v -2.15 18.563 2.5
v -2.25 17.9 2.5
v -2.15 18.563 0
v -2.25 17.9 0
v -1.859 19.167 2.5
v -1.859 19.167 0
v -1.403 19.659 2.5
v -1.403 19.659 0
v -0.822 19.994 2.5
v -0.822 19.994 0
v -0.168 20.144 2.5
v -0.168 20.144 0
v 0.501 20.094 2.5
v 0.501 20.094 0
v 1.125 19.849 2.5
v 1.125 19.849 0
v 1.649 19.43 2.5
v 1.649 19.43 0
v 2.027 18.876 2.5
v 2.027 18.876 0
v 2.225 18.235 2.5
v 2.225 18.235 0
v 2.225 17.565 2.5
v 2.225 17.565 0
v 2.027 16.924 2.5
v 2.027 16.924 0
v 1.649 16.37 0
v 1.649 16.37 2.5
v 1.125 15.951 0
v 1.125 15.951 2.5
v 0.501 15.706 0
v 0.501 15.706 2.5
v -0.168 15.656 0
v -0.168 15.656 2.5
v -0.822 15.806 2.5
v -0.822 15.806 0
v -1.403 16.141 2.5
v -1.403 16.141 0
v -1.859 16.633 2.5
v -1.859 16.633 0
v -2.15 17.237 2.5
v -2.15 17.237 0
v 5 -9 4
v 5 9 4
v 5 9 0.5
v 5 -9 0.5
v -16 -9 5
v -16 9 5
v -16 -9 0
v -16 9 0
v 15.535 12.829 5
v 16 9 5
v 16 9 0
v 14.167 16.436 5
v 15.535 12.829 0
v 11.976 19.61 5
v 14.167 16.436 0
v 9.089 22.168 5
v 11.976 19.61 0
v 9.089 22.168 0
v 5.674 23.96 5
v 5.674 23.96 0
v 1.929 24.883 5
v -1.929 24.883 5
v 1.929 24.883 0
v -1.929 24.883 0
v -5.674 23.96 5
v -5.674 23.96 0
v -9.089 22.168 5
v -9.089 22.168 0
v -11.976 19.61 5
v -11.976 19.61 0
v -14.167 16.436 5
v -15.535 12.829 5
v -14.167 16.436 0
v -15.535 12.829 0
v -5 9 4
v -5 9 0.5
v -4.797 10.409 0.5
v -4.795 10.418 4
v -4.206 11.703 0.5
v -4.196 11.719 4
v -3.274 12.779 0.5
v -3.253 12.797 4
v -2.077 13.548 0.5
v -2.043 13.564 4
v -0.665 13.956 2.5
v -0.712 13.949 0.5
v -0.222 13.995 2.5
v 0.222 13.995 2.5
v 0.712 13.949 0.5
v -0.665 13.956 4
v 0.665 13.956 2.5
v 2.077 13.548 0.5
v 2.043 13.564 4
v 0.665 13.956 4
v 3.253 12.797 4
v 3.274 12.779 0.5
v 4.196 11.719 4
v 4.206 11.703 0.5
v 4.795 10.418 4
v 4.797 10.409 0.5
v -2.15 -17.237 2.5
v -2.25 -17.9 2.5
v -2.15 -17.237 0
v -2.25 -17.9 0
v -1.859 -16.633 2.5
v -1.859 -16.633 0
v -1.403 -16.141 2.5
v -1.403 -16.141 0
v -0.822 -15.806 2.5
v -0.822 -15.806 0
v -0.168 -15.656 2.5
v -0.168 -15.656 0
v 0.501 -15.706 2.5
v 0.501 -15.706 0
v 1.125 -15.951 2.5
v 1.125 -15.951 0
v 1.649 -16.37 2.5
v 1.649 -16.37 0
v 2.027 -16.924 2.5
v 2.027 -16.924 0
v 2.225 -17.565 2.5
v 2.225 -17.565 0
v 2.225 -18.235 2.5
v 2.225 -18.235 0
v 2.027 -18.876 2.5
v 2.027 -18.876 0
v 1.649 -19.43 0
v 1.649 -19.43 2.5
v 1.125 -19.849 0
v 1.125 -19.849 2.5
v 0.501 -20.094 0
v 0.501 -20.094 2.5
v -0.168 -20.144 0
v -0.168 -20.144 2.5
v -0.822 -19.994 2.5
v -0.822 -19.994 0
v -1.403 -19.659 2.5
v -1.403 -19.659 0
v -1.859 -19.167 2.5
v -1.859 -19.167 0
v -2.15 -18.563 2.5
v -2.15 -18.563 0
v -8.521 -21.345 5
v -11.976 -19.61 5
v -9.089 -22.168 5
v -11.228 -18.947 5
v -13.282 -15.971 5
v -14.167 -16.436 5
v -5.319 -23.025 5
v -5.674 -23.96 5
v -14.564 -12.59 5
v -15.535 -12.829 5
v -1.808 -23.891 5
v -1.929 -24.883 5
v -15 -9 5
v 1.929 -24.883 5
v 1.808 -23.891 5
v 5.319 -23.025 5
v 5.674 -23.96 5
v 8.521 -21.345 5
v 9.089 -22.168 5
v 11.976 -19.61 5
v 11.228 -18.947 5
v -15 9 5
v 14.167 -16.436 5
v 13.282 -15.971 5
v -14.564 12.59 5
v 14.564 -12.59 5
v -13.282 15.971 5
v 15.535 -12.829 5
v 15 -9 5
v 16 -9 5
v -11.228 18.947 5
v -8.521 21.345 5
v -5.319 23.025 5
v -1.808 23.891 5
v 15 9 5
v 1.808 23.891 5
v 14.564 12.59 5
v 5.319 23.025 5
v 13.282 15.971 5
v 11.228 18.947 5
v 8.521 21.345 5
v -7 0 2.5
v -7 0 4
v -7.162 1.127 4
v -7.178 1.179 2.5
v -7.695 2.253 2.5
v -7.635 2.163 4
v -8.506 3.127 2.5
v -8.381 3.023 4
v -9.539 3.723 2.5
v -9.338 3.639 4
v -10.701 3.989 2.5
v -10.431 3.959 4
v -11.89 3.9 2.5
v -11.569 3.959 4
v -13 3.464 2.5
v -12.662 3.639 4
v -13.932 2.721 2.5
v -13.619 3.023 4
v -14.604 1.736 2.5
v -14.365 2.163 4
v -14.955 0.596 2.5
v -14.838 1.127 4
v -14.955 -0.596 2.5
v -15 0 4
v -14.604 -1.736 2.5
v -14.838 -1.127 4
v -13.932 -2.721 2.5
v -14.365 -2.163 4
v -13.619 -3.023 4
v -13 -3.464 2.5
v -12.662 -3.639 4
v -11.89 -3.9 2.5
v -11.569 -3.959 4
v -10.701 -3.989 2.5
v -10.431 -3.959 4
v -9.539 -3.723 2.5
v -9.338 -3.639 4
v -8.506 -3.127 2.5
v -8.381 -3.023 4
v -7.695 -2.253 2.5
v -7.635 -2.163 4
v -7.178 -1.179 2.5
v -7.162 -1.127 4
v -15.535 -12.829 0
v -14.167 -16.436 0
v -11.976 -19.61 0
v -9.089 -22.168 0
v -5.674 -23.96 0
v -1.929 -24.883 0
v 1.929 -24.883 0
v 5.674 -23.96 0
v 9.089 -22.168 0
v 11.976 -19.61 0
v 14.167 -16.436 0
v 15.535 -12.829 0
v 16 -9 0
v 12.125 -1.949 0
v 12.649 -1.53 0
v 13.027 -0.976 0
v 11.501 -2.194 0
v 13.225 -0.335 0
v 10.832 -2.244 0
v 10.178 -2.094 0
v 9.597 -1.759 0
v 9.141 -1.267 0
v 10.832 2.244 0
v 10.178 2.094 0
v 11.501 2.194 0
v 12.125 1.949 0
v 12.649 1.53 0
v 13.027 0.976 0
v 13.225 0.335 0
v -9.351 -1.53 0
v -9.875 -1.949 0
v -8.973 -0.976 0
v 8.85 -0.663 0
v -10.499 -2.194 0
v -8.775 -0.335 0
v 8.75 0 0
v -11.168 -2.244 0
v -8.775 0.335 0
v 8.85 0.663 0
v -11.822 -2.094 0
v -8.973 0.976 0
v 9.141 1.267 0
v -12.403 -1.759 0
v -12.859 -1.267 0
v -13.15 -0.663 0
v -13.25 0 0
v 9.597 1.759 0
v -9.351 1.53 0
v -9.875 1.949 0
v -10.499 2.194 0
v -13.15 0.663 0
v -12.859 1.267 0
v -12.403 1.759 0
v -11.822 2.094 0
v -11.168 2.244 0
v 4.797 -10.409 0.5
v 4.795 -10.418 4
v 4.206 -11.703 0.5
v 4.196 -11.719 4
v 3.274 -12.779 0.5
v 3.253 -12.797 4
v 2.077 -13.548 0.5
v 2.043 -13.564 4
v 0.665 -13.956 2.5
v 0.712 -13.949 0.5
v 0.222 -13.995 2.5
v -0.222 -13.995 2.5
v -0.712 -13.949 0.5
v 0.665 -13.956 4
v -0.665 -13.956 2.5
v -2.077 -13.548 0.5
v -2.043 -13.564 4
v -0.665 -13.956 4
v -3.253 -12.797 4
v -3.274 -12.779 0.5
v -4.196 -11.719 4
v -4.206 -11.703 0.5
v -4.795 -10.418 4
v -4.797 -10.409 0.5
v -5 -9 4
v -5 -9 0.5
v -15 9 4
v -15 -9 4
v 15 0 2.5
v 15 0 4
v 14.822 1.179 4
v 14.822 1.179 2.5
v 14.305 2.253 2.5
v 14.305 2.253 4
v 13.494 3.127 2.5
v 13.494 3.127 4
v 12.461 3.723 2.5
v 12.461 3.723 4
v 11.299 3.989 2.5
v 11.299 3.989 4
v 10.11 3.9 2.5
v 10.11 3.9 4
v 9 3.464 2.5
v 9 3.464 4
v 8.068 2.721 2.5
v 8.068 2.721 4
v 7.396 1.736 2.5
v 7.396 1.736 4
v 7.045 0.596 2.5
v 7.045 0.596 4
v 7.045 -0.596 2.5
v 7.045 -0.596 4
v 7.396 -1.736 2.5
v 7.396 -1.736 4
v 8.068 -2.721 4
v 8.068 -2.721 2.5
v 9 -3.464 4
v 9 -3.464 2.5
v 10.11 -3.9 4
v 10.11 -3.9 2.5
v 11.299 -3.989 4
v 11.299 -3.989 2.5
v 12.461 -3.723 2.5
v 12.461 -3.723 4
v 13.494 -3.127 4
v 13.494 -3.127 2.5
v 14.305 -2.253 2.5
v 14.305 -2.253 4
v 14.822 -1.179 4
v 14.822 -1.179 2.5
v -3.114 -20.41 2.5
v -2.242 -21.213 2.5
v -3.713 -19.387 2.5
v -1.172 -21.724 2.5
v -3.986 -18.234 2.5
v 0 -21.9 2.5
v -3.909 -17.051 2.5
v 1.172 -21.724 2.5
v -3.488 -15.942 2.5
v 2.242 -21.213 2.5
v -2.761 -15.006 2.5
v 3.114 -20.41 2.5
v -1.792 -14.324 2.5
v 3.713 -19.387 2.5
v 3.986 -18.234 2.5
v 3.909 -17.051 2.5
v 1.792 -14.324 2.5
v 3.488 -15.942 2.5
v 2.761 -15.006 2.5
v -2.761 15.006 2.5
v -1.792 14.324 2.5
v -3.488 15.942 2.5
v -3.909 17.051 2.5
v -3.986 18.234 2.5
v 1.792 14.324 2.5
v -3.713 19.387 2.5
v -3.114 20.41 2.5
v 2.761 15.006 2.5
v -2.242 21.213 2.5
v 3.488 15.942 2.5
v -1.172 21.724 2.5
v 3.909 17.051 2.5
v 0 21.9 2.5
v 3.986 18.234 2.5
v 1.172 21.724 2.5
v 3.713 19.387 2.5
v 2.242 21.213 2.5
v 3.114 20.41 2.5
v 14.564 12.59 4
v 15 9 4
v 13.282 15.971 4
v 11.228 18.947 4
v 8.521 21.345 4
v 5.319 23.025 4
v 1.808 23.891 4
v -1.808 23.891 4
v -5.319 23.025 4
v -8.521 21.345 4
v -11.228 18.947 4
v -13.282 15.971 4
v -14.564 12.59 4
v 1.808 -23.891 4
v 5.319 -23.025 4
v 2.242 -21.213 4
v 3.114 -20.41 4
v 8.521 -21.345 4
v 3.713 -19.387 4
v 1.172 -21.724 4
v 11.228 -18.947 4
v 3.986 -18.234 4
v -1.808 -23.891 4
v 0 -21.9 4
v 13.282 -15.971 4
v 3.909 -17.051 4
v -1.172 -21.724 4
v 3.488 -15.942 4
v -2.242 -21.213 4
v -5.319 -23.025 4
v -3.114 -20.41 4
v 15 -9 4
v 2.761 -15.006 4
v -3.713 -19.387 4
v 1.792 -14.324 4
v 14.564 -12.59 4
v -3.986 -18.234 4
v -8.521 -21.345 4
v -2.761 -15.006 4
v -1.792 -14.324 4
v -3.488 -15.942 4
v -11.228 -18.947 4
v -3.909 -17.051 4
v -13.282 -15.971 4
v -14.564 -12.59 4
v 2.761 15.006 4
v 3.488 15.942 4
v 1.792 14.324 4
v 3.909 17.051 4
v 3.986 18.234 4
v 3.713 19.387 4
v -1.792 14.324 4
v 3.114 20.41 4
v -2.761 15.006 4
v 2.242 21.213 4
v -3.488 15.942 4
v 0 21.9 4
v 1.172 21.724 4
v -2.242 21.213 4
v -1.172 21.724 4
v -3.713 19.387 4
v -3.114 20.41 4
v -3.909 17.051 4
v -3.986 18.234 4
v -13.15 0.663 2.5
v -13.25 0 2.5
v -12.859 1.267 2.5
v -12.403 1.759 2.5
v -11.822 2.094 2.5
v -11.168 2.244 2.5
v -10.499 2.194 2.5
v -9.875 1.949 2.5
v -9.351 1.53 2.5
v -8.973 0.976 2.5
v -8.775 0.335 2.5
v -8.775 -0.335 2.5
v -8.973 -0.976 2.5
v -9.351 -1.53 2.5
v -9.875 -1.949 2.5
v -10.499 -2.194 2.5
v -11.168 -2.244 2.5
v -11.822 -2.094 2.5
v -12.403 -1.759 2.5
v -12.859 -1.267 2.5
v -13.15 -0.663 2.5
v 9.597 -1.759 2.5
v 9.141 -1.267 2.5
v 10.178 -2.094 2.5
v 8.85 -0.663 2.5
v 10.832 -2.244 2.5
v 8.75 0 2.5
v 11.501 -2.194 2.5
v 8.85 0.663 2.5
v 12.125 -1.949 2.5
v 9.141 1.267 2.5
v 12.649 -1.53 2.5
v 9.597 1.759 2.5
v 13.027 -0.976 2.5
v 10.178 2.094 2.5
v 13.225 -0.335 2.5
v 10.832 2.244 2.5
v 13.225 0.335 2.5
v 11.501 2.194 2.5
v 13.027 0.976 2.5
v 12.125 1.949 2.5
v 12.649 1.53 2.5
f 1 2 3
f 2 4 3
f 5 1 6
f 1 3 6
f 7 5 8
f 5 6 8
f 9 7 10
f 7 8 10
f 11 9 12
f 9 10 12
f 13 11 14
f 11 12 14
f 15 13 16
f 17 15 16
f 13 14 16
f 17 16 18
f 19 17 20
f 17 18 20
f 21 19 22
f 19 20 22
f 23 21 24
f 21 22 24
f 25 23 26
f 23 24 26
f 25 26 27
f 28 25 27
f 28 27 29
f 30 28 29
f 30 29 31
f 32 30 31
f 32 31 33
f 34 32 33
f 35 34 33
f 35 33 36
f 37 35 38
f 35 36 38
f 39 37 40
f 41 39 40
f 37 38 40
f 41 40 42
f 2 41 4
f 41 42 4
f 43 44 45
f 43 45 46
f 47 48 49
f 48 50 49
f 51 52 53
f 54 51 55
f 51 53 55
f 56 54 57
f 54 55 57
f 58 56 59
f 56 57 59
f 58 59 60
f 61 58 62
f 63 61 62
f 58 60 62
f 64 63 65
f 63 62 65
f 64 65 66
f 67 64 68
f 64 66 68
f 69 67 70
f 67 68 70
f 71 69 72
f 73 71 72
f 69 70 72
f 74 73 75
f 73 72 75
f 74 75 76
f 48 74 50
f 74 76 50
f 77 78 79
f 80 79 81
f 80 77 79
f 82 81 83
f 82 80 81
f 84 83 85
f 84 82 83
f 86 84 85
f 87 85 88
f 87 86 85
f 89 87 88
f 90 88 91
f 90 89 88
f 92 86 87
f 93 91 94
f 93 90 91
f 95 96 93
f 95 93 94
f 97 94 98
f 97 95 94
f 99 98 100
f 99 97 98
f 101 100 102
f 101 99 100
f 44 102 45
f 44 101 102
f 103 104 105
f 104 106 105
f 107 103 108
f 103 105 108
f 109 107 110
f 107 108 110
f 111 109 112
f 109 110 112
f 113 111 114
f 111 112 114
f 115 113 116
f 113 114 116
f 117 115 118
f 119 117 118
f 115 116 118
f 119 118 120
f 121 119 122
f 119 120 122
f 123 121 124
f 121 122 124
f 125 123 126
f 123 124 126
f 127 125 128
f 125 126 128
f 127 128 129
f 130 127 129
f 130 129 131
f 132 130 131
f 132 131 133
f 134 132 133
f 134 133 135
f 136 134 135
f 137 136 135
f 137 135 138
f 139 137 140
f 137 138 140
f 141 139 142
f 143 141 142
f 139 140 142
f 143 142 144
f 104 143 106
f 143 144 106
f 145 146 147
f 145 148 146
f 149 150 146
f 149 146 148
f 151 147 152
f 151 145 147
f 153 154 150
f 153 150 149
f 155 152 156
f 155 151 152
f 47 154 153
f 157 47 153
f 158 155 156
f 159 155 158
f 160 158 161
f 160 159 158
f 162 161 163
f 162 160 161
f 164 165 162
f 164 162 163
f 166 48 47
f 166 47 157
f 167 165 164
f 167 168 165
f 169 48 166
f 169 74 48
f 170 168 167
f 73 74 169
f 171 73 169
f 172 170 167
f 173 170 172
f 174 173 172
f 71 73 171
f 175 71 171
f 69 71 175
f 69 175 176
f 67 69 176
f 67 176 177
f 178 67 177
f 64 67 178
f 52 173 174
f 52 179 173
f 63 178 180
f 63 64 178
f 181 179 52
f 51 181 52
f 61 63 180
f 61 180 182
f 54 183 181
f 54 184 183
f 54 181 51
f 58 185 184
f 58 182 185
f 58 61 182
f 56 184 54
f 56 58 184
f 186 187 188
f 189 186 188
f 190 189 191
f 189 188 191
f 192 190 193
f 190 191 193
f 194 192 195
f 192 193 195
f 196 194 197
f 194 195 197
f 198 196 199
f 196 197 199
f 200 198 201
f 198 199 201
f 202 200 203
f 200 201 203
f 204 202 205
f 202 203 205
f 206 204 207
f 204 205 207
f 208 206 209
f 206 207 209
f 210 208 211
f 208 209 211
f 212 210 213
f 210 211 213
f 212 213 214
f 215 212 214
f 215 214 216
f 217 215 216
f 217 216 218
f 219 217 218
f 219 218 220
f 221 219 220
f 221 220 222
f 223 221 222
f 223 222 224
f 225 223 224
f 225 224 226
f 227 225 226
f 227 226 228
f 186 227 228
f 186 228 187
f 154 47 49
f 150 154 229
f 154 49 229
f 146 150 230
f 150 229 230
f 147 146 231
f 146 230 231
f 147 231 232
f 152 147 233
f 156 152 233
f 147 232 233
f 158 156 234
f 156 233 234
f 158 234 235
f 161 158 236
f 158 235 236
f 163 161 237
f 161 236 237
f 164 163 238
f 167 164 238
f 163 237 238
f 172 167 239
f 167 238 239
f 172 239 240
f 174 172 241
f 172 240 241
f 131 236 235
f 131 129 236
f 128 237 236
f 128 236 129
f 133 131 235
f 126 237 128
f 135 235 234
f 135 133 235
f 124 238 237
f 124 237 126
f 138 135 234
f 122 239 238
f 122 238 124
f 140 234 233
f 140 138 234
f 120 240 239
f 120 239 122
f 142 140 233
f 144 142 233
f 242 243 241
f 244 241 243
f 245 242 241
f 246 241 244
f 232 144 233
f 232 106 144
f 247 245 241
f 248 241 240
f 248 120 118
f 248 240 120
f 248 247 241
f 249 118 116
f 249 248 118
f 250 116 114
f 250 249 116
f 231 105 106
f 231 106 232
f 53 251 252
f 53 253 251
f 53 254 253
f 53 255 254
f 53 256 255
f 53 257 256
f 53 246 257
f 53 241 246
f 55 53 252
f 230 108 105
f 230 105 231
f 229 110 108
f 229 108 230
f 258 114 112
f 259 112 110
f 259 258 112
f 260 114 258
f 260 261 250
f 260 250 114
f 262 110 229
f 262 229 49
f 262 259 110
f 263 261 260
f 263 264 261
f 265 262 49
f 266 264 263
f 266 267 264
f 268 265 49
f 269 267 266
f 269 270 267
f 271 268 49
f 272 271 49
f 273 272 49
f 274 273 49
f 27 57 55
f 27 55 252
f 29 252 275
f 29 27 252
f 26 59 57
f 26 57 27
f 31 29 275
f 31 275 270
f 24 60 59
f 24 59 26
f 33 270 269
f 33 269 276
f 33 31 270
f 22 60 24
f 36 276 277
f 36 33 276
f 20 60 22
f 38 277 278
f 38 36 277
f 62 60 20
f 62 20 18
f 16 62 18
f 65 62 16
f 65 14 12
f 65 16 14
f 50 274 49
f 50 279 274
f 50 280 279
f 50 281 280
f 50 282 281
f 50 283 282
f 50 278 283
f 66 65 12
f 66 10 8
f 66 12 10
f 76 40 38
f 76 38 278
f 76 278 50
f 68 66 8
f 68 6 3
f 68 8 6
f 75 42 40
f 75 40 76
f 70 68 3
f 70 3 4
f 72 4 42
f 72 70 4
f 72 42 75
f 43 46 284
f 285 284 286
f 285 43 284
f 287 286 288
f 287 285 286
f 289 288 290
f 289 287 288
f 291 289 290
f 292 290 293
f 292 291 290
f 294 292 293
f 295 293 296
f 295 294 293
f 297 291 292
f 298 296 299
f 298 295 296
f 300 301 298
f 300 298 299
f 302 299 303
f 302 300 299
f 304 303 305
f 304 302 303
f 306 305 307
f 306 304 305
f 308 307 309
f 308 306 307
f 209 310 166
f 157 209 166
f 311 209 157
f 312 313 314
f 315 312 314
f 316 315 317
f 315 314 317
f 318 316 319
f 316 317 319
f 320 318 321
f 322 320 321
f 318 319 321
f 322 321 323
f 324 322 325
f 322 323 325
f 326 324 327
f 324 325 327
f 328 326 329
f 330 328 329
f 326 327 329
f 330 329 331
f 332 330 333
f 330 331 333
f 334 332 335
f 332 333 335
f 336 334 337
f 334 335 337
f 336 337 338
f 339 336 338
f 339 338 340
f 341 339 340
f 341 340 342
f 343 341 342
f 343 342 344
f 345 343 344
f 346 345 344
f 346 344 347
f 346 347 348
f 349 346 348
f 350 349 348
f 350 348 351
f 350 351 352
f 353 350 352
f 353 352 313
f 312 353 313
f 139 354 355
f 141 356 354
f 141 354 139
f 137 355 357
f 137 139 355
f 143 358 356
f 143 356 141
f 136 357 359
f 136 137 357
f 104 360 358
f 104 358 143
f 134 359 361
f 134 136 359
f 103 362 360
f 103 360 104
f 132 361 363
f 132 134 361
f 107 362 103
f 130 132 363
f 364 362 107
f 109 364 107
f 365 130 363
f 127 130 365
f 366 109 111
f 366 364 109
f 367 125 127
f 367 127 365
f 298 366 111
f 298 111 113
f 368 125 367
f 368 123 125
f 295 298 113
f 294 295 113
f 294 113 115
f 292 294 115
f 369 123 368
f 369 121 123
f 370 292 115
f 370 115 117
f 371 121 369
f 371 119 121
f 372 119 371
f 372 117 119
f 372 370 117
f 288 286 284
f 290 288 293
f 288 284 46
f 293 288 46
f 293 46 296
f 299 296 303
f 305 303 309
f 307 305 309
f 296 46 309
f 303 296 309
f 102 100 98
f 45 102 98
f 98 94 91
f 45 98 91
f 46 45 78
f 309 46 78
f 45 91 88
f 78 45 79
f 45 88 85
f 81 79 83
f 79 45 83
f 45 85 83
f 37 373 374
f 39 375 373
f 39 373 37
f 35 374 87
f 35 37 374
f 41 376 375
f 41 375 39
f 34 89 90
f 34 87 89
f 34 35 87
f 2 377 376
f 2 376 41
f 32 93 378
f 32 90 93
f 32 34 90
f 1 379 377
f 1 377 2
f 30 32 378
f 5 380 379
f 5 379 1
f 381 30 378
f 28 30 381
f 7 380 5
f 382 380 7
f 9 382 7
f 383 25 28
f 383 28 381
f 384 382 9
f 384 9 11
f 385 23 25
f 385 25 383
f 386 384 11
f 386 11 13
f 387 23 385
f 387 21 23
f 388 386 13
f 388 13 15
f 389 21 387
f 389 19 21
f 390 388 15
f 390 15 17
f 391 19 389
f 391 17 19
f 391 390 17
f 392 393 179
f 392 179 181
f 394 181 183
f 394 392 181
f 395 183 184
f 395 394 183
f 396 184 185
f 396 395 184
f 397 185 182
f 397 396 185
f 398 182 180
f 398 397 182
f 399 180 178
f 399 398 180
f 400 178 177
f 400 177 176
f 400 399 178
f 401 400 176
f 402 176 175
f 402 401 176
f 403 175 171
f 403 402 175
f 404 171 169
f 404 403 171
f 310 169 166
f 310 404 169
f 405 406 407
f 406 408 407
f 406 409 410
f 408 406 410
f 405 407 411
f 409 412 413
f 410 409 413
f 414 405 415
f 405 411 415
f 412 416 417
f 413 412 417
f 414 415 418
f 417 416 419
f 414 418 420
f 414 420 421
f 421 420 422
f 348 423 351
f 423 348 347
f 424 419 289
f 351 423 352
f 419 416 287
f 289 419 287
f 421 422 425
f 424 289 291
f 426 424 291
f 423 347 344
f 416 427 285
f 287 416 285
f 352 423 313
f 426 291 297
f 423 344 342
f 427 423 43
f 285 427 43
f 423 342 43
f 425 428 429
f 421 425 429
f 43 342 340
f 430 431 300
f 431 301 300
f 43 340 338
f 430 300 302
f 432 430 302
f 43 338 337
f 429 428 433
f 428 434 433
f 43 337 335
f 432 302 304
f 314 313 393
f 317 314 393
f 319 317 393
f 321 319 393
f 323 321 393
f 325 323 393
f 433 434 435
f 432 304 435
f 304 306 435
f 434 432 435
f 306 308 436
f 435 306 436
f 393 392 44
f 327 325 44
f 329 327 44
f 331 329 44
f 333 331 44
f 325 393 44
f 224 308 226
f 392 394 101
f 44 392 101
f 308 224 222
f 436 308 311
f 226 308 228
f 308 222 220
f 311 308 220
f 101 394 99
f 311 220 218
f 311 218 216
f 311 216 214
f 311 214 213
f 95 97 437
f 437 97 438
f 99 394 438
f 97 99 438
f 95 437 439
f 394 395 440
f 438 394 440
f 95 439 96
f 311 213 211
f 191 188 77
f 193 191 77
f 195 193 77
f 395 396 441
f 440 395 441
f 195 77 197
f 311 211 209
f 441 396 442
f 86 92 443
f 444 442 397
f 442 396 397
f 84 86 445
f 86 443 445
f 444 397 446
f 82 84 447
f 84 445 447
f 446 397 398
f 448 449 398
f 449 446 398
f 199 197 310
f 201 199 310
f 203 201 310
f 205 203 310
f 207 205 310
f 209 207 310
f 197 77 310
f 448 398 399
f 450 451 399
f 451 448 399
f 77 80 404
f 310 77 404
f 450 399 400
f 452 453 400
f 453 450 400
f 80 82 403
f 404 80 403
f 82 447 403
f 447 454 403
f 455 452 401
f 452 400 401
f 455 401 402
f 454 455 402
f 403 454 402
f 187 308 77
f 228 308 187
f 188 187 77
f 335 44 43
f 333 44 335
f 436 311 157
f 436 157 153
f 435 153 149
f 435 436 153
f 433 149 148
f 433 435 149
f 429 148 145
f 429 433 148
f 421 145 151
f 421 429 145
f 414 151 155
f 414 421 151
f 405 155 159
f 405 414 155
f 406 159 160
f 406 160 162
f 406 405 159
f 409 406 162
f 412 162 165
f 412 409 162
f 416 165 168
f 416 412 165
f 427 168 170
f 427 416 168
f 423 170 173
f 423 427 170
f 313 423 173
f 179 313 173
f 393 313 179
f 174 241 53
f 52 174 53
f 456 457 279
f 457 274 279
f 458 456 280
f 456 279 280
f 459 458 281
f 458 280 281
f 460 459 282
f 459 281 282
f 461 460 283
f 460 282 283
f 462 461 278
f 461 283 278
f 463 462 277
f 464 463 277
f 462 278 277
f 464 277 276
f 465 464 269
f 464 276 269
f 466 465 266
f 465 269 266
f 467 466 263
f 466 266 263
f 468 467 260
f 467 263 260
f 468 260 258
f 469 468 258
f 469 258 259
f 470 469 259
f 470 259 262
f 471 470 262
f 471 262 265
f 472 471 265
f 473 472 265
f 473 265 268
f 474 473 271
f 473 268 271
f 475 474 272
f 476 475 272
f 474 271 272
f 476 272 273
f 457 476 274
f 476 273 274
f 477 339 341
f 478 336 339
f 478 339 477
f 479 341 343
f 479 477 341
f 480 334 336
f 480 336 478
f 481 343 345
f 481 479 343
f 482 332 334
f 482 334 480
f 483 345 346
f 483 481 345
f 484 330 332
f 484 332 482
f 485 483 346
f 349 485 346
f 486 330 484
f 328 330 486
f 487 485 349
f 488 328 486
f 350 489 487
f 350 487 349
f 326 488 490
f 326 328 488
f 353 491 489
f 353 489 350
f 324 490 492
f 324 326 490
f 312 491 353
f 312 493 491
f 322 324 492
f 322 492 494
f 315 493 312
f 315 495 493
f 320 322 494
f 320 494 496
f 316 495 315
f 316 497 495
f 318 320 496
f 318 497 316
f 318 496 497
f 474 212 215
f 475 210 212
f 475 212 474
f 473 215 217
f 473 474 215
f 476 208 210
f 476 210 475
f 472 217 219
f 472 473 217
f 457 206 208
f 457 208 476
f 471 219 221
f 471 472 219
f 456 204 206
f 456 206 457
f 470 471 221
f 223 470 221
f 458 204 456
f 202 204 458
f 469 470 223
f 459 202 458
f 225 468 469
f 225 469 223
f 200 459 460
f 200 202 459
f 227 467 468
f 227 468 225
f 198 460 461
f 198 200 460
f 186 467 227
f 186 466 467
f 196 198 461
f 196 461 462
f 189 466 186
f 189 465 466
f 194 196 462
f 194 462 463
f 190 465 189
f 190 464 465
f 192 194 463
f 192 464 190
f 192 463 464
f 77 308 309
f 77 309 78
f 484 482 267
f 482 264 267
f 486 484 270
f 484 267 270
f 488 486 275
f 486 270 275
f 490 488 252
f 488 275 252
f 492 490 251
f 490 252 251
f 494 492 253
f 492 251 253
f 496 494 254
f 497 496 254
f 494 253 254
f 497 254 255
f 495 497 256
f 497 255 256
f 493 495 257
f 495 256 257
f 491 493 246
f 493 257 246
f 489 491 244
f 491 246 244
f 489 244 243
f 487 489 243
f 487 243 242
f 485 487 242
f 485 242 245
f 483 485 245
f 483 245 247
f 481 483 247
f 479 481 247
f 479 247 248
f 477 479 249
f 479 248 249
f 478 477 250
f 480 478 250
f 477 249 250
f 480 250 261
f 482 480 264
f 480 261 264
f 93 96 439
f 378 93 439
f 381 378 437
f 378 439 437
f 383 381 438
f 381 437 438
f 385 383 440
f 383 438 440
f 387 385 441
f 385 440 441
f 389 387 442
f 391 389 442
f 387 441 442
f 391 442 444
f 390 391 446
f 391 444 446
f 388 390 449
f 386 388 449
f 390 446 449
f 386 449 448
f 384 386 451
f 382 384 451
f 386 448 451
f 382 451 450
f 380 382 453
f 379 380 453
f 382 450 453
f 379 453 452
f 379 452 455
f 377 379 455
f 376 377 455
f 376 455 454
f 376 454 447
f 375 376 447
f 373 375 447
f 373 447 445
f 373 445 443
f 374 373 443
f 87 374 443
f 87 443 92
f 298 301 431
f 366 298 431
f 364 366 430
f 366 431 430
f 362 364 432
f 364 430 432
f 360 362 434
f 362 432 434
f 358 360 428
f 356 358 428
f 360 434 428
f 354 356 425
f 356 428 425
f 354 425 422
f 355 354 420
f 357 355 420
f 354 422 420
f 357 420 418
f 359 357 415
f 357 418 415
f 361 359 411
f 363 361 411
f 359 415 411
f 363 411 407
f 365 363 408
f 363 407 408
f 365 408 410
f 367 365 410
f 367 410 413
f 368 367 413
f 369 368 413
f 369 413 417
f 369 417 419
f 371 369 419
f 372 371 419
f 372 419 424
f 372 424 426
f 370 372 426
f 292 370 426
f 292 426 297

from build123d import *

# Parameters (mm, degrees)
BOSS_EXTRUDE1_DEPTH                     = 4
CUT_EXTRUDE1_DEPTH                      = 3.5
BOSS_EXTRUDE2_DEPTH                     = 1
CBORE_FOR_M5_HEX_HEAD_BOLT1_D           = 4.5
CBORE_FOR_M5_HEX_HEAD_BOLT1_CBORE_D     = 8
CBORE_FOR_M5_HEX_HEAD_BOLT1_CBORE_DEPTH = 1.5


with BuildPart() as part:
    # Sketch1 → Boss-Extrude1 (new body)
    with BuildSketch(Plane.XY):
        with BuildLine():
            Line((-16, -9), (-16, 9))
            ThreePointArc((-16, 9), (0, 25), (16, 9))
            Line((16, 9), (16, -9))
            ThreePointArc((16, -9), (0, -25), (-16, -9))
        make_face()
    extrude(amount=BOSS_EXTRUDE1_DEPTH)

    # Sketch2 → Cut-Extrude1 (cut)
    with BuildSketch(Plane.XY.offset(4)):
        with BuildLine():
            Line((-5, -9), (-5, 9))
            ThreePointArc((-5, 9), (0, 14), (5, 9))
            Line((5, 9), (5, -9))
            ThreePointArc((5, -9), (0, -14), (-5, -9))
        make_face()
    extrude(amount=-CUT_EXTRUDE1_DEPTH, mode=Mode.SUBTRACT)

    # Sketch3 → Boss-Extrude2 (add)
    with BuildSketch(Plane.XY.offset(4)):
        with BuildLine():
            Line((16, -9), (16, 9))
            ThreePointArc((16, 9), (0, 25), (-16, 9))
            Line((-16, 9), (-16, -9))
            ThreePointArc((-16, -9), (0, -25), (16, -9))
        make_face()
        with BuildLine():
            Line((-15, 9), (-15, -9))
            ThreePointArc((-15, -9), (0, -24), (15, -9))
            Line((15, -9), (15, 9))
            ThreePointArc((15, 9), (0, 24), (-15, 9))
        make_face(mode=Mode.SUBTRACT)
    extrude(amount=BOSS_EXTRUDE2_DEPTH)

    # CBORE for M5 Hex Head Bolt1 (through all)
    with Locations(Plane.XY.offset(4)):
        with Locations((0, 17.9), (11, 0), (-11, 0), (0, -17.9)):
            CounterBoreHole(CBORE_FOR_M5_HEX_HEAD_BOLT1_D / 2, CBORE_FOR_M5_HEX_HEAD_BOLT1_CBORE_D / 2, CBORE_FOR_M5_HEX_HEAD_BOLT1_CBORE_DEPTH)


solid = part.part
